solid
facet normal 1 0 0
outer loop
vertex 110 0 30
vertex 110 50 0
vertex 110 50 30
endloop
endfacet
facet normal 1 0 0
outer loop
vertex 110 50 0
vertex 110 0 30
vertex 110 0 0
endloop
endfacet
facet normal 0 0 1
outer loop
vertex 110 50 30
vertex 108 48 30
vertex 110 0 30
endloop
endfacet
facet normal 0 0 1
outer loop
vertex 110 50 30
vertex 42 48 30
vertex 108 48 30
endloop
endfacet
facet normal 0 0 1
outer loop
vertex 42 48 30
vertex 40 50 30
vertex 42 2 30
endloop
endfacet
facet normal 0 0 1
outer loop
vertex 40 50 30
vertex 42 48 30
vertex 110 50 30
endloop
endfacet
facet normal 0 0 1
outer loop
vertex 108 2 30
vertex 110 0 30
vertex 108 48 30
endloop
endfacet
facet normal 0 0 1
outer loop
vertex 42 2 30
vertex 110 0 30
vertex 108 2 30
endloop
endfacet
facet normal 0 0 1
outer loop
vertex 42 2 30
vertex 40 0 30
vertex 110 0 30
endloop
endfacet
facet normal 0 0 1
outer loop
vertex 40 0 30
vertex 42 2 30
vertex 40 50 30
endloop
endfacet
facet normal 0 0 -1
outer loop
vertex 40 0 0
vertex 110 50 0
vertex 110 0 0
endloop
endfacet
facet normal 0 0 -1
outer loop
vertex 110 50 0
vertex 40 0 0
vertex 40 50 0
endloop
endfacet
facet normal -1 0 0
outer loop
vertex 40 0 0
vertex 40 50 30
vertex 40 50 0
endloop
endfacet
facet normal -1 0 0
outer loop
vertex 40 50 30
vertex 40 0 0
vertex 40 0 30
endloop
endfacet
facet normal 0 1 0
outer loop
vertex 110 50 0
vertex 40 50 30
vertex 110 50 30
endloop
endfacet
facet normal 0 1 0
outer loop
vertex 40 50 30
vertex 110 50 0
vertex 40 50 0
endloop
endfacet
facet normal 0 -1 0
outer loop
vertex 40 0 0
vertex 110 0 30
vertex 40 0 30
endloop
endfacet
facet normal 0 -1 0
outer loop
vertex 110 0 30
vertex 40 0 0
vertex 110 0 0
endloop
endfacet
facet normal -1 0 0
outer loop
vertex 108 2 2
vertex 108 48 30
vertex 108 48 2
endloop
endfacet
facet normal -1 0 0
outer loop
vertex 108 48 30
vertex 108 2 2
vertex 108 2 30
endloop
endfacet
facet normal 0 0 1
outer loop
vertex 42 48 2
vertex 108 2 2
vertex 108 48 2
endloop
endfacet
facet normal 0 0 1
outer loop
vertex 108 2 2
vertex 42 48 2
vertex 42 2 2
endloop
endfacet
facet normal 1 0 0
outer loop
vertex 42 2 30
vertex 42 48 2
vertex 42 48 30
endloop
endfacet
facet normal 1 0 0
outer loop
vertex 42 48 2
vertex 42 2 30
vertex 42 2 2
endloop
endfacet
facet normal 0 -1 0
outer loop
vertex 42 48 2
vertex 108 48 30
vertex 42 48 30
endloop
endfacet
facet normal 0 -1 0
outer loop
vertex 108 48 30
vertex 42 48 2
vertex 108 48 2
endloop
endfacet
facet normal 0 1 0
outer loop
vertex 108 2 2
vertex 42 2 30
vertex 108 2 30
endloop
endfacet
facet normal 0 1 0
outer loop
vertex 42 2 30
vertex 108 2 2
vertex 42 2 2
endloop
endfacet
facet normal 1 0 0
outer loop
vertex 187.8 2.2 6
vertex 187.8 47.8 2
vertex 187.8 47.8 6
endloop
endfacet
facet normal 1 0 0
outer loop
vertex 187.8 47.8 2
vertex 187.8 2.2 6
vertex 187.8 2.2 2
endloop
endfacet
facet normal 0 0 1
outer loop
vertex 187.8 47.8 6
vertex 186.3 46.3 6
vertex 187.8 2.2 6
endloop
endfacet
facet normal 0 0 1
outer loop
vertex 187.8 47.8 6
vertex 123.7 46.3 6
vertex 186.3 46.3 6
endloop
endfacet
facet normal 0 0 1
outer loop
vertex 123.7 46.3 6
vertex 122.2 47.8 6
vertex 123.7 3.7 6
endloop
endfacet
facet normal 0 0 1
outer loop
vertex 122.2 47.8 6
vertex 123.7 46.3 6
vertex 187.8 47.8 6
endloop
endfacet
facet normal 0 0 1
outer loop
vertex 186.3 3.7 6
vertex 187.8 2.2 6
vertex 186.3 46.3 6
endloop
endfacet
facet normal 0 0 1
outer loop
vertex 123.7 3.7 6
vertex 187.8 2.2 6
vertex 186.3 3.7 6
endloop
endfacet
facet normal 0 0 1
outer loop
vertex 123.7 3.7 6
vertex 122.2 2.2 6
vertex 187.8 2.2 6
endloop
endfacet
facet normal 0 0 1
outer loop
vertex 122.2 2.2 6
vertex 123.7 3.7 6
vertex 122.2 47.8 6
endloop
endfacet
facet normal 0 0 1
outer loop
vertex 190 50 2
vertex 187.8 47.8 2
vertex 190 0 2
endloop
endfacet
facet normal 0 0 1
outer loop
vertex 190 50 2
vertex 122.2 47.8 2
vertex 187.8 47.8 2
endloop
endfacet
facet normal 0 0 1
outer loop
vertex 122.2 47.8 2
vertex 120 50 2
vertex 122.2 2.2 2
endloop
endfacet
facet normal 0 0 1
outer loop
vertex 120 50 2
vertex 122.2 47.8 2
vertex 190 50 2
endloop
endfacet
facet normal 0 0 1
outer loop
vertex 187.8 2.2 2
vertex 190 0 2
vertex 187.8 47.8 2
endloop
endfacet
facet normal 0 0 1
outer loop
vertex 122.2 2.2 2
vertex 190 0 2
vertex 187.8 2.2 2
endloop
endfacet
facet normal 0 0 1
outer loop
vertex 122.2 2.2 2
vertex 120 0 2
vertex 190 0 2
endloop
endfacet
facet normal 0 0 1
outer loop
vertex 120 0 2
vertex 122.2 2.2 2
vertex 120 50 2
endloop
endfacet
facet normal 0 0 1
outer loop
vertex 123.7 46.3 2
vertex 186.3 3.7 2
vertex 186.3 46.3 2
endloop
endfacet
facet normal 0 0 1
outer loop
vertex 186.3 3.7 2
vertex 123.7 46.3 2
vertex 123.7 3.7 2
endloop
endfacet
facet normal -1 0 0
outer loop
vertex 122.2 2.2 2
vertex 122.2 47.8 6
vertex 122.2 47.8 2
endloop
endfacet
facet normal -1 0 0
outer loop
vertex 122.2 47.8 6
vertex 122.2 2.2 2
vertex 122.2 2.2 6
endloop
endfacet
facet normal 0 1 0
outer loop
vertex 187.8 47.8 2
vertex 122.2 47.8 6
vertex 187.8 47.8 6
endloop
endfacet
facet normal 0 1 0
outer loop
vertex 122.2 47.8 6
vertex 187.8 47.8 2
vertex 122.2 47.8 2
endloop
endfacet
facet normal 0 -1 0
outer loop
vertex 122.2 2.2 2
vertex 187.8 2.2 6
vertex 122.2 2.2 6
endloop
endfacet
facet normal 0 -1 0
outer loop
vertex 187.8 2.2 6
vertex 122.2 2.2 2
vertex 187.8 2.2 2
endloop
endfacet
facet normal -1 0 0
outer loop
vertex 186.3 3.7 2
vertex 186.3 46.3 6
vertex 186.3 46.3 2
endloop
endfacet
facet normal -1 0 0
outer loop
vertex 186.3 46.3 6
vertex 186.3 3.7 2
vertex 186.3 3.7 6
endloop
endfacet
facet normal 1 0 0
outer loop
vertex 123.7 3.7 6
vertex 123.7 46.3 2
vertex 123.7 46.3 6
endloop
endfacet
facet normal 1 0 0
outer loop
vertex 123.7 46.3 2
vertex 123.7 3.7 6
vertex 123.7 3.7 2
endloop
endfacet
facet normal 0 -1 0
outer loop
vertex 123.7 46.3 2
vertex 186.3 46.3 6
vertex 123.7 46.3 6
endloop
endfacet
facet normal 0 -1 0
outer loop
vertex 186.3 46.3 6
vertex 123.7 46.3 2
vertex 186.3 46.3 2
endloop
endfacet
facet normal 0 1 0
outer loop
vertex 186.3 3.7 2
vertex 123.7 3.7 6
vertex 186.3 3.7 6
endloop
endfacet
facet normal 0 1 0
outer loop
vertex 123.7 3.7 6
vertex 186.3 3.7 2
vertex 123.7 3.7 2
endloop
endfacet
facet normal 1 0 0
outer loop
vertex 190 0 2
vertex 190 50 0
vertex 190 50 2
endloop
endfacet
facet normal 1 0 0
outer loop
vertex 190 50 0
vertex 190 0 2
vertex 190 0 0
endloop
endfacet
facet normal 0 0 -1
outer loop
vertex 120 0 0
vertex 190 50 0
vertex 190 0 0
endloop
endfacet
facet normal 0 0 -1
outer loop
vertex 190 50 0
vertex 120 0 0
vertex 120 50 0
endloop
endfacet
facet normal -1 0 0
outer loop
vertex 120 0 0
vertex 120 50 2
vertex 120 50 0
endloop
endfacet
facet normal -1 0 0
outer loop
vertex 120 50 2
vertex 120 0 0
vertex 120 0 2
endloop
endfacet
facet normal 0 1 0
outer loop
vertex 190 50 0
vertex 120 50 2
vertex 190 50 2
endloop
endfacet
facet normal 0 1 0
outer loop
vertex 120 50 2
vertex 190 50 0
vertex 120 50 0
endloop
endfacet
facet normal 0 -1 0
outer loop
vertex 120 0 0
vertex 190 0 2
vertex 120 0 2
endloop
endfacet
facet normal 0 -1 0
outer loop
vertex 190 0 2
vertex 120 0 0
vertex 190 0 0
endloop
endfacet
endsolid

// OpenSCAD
$fn = 64;

// --- Part 1: Box Dimensions ---
// Outer dimensions (X x Y x Z)
BOX_OUT_X = 70;
BOX_OUT_Y = 50;
BOX_OUT_Z = 30;

// Wall and floor thicknesses
WALL_THICK = 2;
FLOOR_THICK = 2;

// --- Part 2: Lid Dimensions ---
// Plate dimensions (same as box outer)
LID_PLATE_X = 70;
LID_PLATE_Y = 50;
LID_PLATE_THICK = 2;

// Lip dimensions
LIP_WALL_THICK = 1.5;
LIP_HEIGHT = 4;

// Lip outer size (calculated to provide 0.2mm clearance inside the box walls)
// Box inner width = 70 - 2*2 = 66.
// Lip outer width = 66 - 2*0.2 = 65.6.
// Box inner depth = 50 - 2*2 = 46.
// Lip outer depth = 46 - 2*0.2 = 45.6.
LIP_OUT_X = 65.6;
LIP_OUT_Y = 45.6;

// --- Assembly Positioning ---
// Gap between parts
GAP = 10;

// Center the whole assembly on the bed
TOTAL_WIDTH = BOX_OUT_X + GAP + LID_PLATE_X;
OFFSET_X = (TOTAL_WIDTH / 2) - (BOX_OUT_X / 2);

module box() {
    // Create the box shell
    // We use a single difference to create the walls and floor
    difference() {
        // Outer block
        cube([BOX_OUT_X, BOX_OUT_Y, BOX_OUT_Z]);
        
        // Cut out the inner volume (hollow part)
        // Inner dimensions:
        // X: 70 - 2*2 = 66
        // Y: 50 - 2*2 = 46
        // Z: 30 - 2 (floor) = 28
        translate([WALL_THICK, WALL_THICK, FLOOR_THICK]) {
            cube([BOX_OUT_X - 2*WALL_THICK, BOX_OUT_Y - 2*WALL_THICK, BOX_OUT_Z - FLOOR_THICK]);
        }
    }
}

module lid() {
    // The lid is printed upside down relative to the box logic, 
    // but we model it resting on the bed (Z=0) as requested.
    // It consists of a bottom plate and a top lip.
    
    union() {
        // 1. The bottom plate (70 x 50 x 2)
        cube([LID_PLATE_X, LID_PLATE_Y, LID_PLATE_THICK]);
        
        // 2. The lip (rectangular tube)
        // Position: Centered on the plate.
        // Height is LIP_HEIGHT.
        // Thickness is LIP_WALL_THICK.
        // Outer size is LIP_OUT_X x LIP_OUT_Y.
        // Since the plate is at Z=0 and has thickness 2, the lip sits on top.
        translate([
            (LID_PLATE_X - LIP_OUT_X) / 2, 
            (LID_PLATE_Y - LIP_OUT_Y) / 2, 
            LID_PLATE_THICK
        ]) {
            // Create the lip as a hollow block
            difference() {
                // Outer block of the lip
                cube([LIP_OUT_X, LIP_OUT_Y, LIP_HEIGHT]);
                
                // Inner void of the lip
                // Inner X = 65.6 - 2*1.5 = 62.6
                // Inner Y = 45.6 - 2*1.5 = 42.6
                translate([LIP_WALL_THICK, LIP_WALL_THICK, 0]) {
                    cube([LIP_OUT_X - 2*LIP_WALL_THICK, LIP_OUT_Y - 2*LIP_WALL_THICK, LIP_HEIGHT]);
                }
            }
        }
    }
}

// --- Main Assembly ---
translate([OFFSET_X, 0, 0]) {
    box();
}

translate([OFFSET_X + BOX_OUT_X + GAP, 0, 0]) {
    lid();
}
